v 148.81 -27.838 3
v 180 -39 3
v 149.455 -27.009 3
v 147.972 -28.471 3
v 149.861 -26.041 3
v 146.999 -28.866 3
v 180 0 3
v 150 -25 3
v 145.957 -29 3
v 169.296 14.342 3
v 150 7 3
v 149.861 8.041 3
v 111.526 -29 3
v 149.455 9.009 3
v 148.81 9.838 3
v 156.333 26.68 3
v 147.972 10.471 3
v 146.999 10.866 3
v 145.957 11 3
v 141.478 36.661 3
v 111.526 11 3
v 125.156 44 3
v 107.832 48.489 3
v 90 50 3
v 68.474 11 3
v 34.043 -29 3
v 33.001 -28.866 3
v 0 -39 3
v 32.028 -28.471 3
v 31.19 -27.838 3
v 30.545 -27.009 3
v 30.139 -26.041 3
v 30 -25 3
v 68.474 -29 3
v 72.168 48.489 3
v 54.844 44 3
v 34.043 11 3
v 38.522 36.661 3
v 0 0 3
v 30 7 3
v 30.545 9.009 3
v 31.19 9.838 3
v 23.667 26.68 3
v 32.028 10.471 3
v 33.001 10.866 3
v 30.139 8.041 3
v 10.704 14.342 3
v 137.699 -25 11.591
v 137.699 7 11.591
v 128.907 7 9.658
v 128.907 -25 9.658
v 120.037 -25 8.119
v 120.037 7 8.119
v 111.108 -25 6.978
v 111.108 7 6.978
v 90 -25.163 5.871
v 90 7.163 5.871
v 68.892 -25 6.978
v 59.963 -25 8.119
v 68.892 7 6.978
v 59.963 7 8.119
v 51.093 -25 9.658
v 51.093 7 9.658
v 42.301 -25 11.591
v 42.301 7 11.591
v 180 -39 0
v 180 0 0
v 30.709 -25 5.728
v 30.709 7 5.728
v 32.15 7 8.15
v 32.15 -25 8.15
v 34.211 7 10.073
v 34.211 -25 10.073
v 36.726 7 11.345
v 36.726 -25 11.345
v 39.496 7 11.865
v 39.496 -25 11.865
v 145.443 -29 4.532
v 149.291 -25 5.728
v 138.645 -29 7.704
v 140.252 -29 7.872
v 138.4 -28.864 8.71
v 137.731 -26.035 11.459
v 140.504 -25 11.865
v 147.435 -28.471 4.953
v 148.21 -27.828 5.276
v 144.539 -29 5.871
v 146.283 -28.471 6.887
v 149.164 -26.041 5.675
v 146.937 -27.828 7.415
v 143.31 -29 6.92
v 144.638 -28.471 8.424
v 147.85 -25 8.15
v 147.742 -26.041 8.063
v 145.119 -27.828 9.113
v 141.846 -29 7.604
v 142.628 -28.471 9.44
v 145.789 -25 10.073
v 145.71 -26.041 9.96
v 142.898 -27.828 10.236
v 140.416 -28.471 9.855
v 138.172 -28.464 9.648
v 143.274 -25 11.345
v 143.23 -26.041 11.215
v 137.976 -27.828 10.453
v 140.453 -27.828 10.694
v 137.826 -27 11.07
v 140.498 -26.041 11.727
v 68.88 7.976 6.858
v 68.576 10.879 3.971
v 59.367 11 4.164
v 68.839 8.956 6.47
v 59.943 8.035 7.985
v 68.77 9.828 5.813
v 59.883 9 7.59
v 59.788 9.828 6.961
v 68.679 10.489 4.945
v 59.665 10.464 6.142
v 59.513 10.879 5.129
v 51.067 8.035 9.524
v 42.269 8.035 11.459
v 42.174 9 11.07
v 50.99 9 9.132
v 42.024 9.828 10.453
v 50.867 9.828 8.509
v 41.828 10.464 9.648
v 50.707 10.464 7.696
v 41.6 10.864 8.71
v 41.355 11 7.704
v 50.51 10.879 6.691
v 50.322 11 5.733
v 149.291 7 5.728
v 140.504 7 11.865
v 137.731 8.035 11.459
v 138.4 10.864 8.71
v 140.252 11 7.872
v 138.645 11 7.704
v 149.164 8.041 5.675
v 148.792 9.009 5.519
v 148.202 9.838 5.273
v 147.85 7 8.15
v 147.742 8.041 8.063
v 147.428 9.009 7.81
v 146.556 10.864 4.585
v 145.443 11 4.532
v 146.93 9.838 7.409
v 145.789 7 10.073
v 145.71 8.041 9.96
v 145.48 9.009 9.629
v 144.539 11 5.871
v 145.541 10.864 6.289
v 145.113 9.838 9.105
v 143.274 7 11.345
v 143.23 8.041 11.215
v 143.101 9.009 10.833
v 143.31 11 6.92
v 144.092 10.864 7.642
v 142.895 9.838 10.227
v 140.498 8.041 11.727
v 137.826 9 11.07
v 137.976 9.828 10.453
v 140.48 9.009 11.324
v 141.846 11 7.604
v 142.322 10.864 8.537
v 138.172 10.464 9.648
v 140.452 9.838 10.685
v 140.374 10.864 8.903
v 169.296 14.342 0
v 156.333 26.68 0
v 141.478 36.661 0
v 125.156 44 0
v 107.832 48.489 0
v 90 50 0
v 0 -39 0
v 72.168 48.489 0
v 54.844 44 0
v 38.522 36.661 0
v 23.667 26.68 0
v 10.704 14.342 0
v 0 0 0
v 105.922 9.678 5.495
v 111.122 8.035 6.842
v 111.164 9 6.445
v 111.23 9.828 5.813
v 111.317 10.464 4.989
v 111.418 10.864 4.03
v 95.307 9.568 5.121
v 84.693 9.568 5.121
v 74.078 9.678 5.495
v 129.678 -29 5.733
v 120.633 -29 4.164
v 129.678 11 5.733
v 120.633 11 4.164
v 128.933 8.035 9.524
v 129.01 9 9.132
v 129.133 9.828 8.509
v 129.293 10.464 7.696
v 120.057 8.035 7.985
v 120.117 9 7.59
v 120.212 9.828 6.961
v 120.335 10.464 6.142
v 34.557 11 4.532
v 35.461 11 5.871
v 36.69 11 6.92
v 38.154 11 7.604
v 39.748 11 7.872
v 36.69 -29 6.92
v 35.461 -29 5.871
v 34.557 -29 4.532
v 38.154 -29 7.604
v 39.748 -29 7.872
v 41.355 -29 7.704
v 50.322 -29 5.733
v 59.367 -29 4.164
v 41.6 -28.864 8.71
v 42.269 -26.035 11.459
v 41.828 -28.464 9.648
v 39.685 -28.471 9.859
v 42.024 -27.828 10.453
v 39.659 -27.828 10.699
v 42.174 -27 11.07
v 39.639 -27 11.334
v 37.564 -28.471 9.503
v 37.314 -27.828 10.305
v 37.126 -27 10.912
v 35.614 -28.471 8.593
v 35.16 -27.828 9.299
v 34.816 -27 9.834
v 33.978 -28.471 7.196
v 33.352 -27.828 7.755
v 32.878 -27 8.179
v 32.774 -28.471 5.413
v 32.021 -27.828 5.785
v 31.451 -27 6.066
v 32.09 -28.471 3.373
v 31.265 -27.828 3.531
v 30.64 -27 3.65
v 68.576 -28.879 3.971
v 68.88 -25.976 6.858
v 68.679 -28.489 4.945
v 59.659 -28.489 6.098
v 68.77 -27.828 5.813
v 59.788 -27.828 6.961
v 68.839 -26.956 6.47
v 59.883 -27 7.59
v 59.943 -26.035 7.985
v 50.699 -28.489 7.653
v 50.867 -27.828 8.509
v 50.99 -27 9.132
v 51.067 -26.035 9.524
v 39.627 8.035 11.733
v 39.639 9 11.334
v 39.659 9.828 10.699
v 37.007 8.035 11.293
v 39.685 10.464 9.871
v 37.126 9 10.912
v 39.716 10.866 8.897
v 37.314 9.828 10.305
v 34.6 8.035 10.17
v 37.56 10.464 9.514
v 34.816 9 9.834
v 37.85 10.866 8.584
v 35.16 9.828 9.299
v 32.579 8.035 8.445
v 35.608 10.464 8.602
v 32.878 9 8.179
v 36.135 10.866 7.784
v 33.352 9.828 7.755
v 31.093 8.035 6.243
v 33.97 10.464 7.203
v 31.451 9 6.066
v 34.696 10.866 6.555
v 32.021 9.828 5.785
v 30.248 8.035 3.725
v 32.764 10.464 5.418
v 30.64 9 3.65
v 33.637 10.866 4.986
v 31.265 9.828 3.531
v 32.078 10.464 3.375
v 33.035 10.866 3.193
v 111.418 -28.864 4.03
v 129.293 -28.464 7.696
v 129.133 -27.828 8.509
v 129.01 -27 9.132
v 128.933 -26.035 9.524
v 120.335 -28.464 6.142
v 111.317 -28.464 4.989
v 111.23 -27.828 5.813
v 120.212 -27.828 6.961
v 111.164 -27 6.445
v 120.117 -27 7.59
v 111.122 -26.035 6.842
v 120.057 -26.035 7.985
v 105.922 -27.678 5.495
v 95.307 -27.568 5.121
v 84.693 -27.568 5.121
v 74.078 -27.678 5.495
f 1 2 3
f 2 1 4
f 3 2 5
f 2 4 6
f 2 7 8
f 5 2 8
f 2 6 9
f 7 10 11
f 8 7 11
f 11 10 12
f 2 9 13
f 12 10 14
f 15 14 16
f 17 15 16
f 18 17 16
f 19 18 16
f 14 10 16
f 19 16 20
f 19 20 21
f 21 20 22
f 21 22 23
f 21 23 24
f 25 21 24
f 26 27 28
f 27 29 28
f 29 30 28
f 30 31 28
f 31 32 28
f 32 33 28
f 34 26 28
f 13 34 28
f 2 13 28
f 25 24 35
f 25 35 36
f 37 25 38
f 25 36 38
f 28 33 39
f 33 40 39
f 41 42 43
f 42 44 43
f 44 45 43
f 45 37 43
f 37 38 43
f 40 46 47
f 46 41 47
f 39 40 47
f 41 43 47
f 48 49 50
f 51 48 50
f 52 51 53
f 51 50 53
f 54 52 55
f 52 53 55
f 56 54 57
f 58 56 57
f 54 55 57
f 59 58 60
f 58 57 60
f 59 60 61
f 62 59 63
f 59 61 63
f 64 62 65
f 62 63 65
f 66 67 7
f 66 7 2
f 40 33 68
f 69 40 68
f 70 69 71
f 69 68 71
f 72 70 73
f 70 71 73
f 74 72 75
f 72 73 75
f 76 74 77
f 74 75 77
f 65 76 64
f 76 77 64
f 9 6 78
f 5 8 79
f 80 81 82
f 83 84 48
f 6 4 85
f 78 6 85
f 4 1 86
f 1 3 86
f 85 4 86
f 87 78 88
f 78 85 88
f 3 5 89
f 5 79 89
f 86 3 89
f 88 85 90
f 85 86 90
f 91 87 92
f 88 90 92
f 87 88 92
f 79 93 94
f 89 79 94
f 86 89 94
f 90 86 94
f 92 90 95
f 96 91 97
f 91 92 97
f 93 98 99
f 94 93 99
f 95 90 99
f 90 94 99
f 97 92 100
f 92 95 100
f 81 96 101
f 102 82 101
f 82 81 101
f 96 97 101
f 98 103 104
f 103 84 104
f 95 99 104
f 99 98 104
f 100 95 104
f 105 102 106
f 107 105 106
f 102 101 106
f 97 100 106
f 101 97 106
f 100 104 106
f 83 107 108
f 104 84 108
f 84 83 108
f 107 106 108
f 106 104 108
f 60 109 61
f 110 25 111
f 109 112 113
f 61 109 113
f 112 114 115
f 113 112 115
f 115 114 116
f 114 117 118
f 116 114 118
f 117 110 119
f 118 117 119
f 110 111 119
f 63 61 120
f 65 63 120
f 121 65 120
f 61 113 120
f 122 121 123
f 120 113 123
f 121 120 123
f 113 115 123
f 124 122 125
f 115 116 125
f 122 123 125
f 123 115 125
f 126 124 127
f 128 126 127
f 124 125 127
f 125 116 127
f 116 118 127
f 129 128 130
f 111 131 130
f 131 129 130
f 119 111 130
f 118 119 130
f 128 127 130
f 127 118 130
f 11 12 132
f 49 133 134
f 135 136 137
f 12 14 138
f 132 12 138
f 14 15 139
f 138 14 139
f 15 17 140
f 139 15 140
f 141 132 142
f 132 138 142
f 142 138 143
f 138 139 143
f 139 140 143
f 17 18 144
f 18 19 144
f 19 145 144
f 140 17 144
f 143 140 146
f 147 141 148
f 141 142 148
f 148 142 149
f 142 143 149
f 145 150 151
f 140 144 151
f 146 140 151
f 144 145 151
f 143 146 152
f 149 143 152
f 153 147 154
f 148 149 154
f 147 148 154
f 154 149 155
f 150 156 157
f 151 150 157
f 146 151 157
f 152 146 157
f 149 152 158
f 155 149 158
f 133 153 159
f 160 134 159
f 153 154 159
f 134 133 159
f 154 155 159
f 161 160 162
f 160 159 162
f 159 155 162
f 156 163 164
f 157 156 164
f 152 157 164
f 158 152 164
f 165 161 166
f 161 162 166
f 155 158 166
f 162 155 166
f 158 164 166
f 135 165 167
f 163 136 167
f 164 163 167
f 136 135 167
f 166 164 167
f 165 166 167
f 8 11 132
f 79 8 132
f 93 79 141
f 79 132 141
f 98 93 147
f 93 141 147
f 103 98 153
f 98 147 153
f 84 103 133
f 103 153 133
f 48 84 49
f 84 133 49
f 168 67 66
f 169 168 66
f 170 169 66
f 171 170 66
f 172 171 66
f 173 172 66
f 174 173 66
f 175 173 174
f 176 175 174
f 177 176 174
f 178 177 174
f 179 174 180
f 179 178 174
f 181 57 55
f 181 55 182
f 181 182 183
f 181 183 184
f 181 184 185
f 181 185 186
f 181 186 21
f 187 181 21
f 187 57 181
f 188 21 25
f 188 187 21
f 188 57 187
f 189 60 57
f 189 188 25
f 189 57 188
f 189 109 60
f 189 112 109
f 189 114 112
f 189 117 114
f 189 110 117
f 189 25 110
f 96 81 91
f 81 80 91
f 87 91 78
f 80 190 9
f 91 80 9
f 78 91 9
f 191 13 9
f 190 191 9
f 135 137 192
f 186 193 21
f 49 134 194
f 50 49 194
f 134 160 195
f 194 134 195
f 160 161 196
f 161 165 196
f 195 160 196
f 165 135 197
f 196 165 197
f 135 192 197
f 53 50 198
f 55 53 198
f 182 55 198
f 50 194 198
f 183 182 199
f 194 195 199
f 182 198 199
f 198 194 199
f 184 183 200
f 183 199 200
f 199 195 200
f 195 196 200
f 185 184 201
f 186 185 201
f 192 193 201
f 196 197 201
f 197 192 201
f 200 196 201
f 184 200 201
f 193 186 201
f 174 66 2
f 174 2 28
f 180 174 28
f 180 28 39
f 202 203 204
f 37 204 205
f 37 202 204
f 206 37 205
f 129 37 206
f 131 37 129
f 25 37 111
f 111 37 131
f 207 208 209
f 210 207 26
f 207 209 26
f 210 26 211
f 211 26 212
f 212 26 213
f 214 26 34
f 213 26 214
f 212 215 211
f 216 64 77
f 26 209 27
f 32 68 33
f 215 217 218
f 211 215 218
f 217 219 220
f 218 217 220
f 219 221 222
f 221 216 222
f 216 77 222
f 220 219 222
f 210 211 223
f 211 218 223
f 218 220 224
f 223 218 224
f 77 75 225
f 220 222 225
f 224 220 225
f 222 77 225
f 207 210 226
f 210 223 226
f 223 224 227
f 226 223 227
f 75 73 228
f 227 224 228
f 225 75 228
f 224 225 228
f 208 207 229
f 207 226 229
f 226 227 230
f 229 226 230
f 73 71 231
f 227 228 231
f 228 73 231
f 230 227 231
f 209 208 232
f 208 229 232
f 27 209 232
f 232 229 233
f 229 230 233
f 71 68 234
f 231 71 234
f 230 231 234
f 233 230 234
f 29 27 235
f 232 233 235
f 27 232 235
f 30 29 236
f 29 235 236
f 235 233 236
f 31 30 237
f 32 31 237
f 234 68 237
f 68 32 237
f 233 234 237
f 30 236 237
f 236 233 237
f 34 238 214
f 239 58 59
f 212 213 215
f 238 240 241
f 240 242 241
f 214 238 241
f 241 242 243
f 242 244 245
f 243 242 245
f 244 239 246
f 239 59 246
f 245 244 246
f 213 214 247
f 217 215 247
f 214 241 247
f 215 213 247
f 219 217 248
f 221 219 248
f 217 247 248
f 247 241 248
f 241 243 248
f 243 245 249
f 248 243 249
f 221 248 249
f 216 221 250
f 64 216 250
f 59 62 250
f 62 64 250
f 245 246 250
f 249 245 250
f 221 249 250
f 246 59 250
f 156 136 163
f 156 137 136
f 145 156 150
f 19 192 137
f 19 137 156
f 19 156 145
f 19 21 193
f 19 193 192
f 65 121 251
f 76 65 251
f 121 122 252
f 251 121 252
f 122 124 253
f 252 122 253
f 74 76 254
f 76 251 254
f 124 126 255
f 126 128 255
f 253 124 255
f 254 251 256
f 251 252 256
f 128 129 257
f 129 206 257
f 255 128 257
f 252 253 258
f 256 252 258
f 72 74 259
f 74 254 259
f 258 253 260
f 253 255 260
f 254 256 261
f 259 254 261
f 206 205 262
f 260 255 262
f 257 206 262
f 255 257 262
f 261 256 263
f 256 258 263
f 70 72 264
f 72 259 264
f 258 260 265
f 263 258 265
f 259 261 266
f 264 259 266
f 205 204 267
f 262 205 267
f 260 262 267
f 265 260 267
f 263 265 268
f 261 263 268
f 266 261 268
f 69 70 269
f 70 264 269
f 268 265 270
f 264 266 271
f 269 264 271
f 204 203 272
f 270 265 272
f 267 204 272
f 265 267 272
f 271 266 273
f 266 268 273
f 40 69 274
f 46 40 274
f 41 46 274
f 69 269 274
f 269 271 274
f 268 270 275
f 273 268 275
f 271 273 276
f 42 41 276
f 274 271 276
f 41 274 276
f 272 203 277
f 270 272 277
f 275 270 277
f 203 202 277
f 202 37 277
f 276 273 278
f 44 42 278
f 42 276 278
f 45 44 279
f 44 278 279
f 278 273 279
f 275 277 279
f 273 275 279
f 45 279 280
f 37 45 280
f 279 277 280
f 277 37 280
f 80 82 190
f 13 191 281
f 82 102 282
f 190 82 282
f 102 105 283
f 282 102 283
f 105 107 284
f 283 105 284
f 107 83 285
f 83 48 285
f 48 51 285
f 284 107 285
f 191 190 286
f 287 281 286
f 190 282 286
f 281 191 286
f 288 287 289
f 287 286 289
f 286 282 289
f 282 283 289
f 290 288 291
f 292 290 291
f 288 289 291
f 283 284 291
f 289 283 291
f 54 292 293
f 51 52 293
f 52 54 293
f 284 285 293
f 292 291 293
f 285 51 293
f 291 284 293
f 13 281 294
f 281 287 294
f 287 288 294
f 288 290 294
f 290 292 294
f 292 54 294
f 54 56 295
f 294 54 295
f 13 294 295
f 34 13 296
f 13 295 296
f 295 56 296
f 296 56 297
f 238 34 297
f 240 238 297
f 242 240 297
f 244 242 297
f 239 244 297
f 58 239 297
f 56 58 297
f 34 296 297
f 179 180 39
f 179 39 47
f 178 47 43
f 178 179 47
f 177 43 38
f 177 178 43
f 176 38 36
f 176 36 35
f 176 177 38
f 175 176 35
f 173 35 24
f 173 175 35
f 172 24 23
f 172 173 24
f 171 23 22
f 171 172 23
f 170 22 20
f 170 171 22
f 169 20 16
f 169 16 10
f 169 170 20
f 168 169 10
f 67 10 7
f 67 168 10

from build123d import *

# Parameters (mm, degrees)
BOSS_EXTRUDE1_DEPTH = 3
SKETCH2_W           = 120
SKETCH2_H           = 40
BOSS_EXTRUDE2_DEPTH = 12
CUT_EXTRUDE1_REACH  = 189.417
FILLET1_R           = 10
FILLET2_R           = 4


with BuildPart() as part:
    # Sketch1 → Boss-Extrude1 (new body)
    with BuildSketch(Plane.XY):
        with BuildLine():
            Line((180, 0), (180, -39))
            Line((180, -39), (0, -39))
            Line((0, -39), (0, 0))
            ThreePointArc((0, 0), (90, 50), (180, 0))
        make_face()
    extrude(amount=BOSS_EXTRUDE1_DEPTH)

    # Sketch2 → Boss-Extrude2 (add)
    with BuildSketch(Plane.XY.offset(3)):
        with Locations((90, -9)):
            Rectangle(SKETCH2_W, SKETCH2_H)
    extrude(amount=BOSS_EXTRUDE2_DEPTH)

    # Sketch3 → Cut-Extrude1 (cut, up to next)
    with BuildSketch(Plane(origin=(0, 11, 0), x_dir=(1, 0, 0), z_dir=(0, 1, 0)), mode=Mode.PRIVATE) as cut_extrude1_sk1:
        with BuildLine():
            Line((30, -15), (150, -15))
            ThreePointArc((150, -15), (90, -5.870751133), (30, -15))
        make_face()
    cut_extrude1_tool1 = extrude(cut_extrude1_sk1.sketch, amount=-CUT_EXTRUDE1_REACH, mode=Mode.PRIVATE) & part.part
    add(cut_extrude1_tool1.solids().sort_by_distance((90, 11, 11.341124))[0], mode=Mode.SUBTRACT)

    # Fillet1
    # the kernel refuses this fillet: 10 mm, written as the material it takes off along each edge
    with BuildSketch(Plane(origin=(150, 42.911423728, 15), x_dir=(0, 0, -1), z_dir=(0, -1, 0)), Plane(origin=(30, -60.911423728, 15), x_dir=(0, 0, -1), z_dir=(0, 1, 0))) as fillet1_piece_1:
        with BuildLine():
            CenterArc((13.125456564, -9.936465545), FILLET1_R, 96.462082414, 97.214818073)
            Line((3.409011311, -12.300929891), (3.214682406, -12.348219178))
            ThreePointArc((3.214682406, -12.348219178), (1.609086457, -6.176908891), (-0.190949181, -0.059484539))
            Line((-0.190949181, -0.059484539), (0, 0.2))
            ThreePointArc((0, 0.2), (6, 0.2), (11.977490869, 0.198729311))
            Line((11.977490869, 0.198729311), (12, 0))
        make_face()
    extrude(amount=103.822847456, mode=Mode.SUBTRACT)

    # Fillet2
    fillet2_edges = [part.edges().sort_by_distance(p)[0] for p in [
        (90, -29, 5.870751133),
        (90, 11, 5.870751133),
        (34.210640521, 11, 10.073014501),
        (145.789359479, 11, 10.073014501),
        (34.210640521, -29, 10.073014501),
        (145.789359479, -29, 10.073014501),
    ]]
    fillet(fillet2_edges, radius=FILLET2_R)


solid = part.part
